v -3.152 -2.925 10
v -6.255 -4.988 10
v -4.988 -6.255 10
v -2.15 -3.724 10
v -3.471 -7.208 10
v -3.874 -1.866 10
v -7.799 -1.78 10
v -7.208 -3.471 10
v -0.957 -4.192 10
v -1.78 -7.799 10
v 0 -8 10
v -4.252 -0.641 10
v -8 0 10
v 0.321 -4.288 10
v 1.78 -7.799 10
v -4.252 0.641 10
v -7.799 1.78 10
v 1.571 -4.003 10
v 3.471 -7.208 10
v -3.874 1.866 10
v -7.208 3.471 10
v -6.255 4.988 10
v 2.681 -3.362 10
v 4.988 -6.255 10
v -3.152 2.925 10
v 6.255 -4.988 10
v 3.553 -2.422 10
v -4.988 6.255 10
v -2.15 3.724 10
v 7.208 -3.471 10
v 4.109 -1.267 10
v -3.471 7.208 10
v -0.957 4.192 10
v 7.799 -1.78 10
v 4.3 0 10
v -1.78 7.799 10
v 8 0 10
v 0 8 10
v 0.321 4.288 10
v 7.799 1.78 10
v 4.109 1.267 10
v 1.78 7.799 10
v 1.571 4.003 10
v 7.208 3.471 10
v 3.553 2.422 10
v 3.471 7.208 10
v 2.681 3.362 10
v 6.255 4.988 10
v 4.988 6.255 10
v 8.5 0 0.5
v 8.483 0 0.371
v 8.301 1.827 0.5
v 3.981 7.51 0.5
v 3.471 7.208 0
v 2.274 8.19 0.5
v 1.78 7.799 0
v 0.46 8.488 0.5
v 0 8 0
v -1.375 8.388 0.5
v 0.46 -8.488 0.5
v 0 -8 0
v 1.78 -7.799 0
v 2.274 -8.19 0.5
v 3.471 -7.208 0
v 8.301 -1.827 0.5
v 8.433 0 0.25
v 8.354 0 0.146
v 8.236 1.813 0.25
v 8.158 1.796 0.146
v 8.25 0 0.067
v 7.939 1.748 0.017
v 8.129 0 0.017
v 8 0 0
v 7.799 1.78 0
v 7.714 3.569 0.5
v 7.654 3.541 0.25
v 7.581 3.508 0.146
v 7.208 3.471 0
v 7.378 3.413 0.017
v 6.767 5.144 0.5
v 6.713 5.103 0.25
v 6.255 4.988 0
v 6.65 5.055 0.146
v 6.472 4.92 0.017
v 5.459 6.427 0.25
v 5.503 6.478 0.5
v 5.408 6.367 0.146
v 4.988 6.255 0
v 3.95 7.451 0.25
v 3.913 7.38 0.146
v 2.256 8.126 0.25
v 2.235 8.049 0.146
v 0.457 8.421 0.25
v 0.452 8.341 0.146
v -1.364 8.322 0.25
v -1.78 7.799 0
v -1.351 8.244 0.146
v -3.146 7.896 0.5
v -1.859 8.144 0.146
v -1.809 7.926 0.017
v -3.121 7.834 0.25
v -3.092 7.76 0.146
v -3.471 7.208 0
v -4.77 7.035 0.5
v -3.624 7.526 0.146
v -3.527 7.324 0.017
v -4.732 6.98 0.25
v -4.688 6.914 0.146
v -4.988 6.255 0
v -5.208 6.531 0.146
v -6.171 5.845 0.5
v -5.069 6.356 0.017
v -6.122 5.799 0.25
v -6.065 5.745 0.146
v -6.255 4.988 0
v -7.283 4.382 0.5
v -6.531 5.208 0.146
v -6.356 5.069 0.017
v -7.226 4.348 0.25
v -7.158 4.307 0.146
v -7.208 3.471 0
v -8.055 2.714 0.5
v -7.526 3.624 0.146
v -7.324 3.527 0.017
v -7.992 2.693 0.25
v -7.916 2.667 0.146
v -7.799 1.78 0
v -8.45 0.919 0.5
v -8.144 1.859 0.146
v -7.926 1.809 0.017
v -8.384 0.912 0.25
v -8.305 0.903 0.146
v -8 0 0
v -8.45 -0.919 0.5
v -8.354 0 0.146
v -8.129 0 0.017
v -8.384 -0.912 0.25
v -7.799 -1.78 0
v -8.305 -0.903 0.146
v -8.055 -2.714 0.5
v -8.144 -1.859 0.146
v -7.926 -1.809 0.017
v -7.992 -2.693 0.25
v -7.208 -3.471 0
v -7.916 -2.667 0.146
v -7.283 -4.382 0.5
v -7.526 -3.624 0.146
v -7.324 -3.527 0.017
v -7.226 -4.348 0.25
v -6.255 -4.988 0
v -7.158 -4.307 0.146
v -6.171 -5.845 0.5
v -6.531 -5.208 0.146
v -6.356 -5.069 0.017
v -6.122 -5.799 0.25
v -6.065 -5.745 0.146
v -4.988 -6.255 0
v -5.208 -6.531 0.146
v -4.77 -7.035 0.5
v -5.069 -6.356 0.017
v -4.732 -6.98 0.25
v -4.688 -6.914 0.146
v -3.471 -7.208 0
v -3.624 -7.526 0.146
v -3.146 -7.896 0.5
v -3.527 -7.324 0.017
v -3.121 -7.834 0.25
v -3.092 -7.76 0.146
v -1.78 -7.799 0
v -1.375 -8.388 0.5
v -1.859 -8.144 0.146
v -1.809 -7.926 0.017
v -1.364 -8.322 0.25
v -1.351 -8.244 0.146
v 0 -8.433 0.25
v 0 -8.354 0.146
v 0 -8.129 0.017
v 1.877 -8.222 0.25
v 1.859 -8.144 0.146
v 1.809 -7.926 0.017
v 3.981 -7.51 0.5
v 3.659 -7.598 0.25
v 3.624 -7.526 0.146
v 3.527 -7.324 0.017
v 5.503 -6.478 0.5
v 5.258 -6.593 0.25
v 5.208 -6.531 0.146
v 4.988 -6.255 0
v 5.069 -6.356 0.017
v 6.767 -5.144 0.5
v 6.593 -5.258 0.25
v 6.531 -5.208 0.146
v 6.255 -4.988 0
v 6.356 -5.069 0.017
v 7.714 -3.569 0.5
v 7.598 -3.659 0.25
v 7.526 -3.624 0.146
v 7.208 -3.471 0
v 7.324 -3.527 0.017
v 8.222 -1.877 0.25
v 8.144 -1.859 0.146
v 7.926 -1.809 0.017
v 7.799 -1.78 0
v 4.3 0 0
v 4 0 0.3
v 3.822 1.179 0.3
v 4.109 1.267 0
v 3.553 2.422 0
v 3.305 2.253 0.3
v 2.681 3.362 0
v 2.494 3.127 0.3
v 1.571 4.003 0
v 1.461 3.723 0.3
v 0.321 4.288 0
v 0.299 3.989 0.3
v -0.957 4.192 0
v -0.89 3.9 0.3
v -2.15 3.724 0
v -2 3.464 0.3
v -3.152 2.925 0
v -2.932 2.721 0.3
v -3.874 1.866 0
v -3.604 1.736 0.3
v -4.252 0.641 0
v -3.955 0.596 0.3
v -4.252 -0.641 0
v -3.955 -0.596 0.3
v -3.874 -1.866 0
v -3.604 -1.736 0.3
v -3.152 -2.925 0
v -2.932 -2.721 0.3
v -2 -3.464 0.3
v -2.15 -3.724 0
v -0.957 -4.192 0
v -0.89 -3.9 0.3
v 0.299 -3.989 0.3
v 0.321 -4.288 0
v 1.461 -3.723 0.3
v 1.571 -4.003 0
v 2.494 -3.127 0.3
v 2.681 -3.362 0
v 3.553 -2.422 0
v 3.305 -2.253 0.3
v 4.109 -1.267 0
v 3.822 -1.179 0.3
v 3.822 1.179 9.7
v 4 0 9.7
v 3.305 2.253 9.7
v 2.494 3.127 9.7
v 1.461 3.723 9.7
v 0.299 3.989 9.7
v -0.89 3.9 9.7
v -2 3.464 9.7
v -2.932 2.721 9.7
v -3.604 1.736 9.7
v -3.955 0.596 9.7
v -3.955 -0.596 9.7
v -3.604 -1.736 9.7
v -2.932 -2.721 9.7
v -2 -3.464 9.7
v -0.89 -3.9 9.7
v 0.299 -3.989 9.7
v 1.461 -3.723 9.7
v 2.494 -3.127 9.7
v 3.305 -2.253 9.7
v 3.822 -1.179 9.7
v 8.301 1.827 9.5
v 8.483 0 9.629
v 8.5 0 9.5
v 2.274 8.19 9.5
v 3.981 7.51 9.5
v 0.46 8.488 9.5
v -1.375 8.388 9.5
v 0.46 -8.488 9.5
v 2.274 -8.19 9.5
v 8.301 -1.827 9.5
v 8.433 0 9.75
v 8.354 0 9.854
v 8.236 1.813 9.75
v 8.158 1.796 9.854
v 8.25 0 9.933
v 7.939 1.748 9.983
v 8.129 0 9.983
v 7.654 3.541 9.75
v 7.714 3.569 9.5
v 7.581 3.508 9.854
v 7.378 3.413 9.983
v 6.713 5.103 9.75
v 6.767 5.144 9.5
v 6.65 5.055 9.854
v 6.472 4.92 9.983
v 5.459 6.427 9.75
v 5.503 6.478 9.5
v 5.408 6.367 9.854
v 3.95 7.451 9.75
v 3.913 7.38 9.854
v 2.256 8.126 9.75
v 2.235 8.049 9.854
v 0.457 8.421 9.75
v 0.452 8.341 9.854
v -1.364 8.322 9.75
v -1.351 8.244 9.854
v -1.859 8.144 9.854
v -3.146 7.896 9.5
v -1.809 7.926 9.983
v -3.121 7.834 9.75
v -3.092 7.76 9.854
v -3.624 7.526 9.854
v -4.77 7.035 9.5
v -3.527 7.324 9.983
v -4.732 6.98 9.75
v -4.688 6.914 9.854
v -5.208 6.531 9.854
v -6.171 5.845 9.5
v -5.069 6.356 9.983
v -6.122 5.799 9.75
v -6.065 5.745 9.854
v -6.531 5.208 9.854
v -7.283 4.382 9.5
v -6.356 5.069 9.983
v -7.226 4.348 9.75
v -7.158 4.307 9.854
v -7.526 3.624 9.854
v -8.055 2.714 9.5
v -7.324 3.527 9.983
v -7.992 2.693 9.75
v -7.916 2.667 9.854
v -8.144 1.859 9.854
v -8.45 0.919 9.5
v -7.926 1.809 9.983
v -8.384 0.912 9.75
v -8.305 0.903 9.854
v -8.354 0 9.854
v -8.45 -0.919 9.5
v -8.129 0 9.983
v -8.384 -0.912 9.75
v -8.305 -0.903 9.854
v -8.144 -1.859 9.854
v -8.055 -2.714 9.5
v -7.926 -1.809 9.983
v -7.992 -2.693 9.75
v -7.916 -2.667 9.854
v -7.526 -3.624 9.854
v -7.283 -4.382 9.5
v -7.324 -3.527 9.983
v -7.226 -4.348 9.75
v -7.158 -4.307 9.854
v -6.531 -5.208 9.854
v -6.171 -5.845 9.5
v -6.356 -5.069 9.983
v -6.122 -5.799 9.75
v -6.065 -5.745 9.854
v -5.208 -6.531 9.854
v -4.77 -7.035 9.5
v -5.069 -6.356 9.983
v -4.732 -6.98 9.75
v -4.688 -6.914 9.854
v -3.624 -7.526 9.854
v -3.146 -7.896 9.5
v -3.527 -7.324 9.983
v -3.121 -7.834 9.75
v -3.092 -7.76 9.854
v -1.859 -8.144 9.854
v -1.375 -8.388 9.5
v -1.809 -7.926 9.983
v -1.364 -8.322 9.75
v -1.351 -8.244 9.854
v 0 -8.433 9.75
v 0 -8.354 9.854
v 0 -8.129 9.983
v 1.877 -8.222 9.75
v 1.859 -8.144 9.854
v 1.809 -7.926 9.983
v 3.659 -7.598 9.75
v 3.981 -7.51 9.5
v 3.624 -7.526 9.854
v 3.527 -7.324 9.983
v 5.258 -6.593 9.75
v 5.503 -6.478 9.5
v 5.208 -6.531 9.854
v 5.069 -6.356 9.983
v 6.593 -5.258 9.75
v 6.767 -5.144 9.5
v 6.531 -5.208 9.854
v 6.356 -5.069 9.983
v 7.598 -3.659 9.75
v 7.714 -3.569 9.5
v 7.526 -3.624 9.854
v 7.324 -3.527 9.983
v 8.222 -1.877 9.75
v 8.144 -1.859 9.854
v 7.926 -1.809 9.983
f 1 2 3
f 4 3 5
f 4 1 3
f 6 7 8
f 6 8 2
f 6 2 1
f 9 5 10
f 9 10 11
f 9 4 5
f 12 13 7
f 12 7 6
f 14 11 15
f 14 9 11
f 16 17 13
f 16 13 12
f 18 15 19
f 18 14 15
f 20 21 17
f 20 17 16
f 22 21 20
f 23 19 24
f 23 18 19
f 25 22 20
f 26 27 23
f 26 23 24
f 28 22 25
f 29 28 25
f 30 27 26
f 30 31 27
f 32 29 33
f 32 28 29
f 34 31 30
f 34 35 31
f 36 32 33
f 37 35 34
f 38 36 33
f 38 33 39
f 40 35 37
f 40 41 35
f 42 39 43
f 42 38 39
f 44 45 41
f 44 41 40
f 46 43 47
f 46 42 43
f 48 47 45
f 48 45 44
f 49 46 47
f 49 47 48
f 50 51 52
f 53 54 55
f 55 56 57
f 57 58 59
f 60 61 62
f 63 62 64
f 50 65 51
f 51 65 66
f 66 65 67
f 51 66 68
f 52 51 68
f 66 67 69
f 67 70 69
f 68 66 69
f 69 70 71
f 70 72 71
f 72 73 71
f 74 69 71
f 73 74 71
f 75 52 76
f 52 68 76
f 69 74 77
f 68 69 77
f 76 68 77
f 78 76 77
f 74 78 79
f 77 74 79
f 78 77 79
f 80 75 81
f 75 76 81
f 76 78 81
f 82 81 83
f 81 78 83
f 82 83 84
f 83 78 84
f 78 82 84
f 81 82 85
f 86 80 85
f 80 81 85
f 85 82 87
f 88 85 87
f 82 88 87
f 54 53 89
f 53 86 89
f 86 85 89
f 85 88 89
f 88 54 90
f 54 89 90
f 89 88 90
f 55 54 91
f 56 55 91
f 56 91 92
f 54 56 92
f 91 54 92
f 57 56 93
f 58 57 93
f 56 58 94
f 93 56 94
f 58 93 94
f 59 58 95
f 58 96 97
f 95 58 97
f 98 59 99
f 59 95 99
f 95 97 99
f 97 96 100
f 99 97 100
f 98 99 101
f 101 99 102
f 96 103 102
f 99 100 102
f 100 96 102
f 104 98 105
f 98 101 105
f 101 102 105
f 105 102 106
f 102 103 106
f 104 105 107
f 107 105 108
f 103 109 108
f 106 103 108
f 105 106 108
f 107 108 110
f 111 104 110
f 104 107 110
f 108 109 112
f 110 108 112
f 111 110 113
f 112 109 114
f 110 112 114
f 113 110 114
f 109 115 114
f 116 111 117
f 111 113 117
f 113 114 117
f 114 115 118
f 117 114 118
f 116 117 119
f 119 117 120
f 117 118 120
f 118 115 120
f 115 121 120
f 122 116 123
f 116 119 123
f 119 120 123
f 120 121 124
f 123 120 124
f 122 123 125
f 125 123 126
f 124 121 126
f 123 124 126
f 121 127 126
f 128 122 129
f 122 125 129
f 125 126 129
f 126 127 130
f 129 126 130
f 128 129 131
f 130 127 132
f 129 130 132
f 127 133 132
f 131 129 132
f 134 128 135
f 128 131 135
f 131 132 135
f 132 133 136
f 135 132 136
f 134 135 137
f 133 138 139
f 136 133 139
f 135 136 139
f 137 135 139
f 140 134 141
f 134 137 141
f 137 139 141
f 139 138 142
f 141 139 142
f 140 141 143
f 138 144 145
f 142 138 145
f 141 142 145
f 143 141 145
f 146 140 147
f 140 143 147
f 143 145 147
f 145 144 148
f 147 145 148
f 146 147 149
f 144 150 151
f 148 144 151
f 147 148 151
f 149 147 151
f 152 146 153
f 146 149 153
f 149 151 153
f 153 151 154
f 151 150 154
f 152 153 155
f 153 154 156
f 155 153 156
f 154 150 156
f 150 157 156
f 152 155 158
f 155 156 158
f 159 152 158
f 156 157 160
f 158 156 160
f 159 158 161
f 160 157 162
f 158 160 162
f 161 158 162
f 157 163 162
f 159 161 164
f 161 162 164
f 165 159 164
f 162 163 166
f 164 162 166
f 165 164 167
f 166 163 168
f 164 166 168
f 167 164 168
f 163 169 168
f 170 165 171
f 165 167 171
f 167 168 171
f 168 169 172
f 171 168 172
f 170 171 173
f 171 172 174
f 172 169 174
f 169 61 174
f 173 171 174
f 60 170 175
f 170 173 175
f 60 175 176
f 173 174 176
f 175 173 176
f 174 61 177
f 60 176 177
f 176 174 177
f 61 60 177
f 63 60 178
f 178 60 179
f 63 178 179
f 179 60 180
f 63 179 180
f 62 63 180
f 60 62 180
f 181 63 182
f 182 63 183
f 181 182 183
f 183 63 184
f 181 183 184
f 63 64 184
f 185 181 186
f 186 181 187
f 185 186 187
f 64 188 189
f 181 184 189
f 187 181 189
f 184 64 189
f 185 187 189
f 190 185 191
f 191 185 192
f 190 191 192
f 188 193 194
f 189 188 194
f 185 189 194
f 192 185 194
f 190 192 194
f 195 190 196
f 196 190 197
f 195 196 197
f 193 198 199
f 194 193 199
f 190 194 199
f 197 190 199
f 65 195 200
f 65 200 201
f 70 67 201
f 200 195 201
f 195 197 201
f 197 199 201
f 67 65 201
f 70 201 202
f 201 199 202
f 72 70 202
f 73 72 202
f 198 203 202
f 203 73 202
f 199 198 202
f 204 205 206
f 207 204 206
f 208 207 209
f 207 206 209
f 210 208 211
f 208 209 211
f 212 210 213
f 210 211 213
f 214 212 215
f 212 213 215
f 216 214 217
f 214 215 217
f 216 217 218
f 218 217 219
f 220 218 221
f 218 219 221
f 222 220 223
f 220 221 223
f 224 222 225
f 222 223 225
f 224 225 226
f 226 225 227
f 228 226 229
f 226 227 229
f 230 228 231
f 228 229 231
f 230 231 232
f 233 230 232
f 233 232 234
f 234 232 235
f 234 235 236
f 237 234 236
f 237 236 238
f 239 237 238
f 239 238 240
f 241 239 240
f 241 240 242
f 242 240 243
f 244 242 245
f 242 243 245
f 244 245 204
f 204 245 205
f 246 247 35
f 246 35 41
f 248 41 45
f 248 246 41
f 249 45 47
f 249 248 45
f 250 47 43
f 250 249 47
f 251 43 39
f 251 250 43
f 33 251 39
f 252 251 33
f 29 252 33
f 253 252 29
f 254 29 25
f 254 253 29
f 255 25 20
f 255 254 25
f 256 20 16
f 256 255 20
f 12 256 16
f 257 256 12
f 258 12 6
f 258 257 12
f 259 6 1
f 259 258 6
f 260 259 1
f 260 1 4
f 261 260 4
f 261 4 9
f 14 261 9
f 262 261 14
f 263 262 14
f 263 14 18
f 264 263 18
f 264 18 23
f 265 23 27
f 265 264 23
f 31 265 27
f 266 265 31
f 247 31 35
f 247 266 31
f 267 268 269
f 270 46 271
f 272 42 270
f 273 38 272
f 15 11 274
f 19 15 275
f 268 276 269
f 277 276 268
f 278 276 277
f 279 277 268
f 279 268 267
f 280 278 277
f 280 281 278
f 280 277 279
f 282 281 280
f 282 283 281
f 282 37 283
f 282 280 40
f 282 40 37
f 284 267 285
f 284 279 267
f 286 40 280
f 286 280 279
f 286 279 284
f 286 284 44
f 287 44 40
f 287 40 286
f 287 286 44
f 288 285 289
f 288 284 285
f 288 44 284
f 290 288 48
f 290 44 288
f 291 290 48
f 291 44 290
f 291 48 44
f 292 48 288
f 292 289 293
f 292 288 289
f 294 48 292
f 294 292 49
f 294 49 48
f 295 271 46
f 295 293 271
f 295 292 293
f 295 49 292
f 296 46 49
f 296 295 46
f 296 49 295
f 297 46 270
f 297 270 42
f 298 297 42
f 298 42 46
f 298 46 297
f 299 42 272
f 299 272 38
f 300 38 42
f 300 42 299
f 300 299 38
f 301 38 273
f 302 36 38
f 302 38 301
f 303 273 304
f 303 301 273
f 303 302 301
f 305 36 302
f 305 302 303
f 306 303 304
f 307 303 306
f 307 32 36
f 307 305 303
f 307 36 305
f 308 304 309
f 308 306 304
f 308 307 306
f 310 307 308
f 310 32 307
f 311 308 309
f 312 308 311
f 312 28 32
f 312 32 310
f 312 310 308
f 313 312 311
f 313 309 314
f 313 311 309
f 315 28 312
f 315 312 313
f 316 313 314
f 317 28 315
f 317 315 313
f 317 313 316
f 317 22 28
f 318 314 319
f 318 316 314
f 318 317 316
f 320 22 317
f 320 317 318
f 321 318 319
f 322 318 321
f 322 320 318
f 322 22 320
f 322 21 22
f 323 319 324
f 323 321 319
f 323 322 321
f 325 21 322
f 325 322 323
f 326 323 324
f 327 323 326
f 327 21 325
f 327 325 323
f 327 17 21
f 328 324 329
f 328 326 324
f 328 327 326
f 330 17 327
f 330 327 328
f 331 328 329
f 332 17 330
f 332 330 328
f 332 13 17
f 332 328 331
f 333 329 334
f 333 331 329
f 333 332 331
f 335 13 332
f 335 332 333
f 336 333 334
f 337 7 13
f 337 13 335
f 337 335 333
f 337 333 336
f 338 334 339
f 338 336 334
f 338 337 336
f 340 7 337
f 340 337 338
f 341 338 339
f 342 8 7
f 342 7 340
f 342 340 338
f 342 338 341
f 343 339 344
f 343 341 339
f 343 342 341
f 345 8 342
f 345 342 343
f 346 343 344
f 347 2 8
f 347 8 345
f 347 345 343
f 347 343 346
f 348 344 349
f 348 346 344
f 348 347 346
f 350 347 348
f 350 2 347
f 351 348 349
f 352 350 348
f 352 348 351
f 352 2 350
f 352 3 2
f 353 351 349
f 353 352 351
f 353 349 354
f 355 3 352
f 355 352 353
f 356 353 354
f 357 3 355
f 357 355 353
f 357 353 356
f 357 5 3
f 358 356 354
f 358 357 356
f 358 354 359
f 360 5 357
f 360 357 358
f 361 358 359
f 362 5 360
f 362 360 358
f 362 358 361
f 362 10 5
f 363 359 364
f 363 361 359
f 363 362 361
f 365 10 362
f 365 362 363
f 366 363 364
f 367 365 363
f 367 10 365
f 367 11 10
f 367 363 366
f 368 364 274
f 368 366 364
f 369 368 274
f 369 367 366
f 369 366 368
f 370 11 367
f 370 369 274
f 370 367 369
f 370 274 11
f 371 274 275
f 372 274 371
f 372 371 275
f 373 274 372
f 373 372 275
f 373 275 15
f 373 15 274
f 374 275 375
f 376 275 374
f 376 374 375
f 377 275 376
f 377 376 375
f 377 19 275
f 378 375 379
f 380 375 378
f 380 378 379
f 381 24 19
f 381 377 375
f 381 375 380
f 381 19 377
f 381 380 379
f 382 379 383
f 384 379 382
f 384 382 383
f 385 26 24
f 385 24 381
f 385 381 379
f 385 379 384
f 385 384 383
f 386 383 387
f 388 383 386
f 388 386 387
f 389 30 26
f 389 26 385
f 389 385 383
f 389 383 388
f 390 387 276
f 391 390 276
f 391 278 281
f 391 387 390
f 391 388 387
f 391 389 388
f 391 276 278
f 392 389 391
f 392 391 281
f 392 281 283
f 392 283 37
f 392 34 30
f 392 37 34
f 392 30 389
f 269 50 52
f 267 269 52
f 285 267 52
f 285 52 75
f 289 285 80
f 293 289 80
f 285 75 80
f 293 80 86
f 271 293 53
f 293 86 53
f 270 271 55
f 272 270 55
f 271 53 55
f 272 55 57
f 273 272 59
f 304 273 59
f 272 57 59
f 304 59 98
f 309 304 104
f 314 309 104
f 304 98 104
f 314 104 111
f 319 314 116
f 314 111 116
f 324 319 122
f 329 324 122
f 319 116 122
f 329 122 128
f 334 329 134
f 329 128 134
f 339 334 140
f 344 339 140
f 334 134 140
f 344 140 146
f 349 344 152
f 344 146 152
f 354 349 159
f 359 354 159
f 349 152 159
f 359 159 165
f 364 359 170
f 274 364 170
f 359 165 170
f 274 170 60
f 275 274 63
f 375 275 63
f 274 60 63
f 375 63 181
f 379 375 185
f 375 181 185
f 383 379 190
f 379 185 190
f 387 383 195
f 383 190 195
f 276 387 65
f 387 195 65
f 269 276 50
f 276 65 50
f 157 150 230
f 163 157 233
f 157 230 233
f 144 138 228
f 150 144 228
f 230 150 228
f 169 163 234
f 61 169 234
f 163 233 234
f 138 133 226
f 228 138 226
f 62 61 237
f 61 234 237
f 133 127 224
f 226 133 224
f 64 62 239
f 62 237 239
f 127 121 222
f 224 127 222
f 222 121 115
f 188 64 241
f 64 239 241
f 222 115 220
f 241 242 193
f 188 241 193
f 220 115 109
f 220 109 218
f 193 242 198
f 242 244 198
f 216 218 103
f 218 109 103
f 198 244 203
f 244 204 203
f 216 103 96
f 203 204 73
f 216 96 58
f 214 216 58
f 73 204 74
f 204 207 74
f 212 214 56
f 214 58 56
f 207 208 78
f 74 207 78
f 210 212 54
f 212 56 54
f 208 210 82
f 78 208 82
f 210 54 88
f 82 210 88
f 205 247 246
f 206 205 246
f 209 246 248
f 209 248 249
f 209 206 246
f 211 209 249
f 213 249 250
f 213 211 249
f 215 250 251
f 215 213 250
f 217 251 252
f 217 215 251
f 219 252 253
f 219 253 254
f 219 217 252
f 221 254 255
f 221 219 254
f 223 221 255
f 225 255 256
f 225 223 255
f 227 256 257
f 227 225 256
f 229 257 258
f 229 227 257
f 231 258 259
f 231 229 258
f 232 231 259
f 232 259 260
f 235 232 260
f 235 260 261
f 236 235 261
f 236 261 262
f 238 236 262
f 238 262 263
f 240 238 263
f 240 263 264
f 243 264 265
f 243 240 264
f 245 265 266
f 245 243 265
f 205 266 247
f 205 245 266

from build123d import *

# Parameters (mm, degrees)
SKETCH1_R           = 8.5
SKETCH1_R_2         = 4
BOSS_EXTRUDE1_DEPTH = 10
FILLET1_R           = 0.5
CHAMFER1_SIZE       = 0.3


with BuildPart() as part:
    # Sketch1 → Boss-Extrude1 (new body)
    with BuildSketch(Plane.XY):
        Circle(SKETCH1_R)
        Circle(SKETCH1_R_2, mode=Mode.SUBTRACT)
    extrude(amount=BOSS_EXTRUDE1_DEPTH)

    # Fillet1
    fillet1_edges = [part.edges().sort_by_distance(p)[0] for p in [
        (-8.5, 0, 0),
        (-8.5, 0, 10),
    ]]
    fillet(fillet1_edges, radius=FILLET1_R)

    # Chamfer1
    chamfer1_edges = [part.edges().sort_by_distance(p)[0] for p in [
        (-4, 0, 0),
        (-4, 0, 10),
    ]]
    chamfer(chamfer1_edges, length=CHAMFER1_SIZE)


solid = part.part
